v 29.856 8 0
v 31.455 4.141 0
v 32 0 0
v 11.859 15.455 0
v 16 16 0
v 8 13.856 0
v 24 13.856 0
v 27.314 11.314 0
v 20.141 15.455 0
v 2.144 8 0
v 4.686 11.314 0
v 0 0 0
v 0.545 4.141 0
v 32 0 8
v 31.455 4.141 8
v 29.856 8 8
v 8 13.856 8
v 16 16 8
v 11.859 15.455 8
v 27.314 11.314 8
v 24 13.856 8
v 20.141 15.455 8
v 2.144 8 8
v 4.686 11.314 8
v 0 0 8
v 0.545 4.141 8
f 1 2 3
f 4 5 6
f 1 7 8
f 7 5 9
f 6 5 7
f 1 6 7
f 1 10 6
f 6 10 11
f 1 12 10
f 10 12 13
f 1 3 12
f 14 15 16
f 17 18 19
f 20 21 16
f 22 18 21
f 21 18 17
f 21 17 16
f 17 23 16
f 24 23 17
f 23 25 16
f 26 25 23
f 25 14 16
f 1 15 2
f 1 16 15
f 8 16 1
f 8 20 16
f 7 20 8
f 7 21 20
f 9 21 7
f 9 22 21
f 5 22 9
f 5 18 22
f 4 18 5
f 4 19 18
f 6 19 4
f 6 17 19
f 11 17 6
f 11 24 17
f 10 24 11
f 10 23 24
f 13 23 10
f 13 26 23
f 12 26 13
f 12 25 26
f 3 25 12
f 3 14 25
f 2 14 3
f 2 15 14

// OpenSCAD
$fn = 32;

// ----------------------------------------------------------------------
// Key bar: woodruff key, 8 mm thick
// ----------------------------------------------------------------------

// --- parameters (mm) ---
profile_height = 8;       // extrusion height
profile_points = 13;      // points of the closed outline

profile = [[32, 0], [31.455, 4.141], [29.856, 8], [27.314, 11.314], [24, 13.856], [20.141, 15.455], [16, 16], [11.859, 15.455], [8, 13.856], [4.686, 11.314], [2.144, 8], [0.545, 4.141], [0, 0]];  // single closed polygon, 13 points, counter clockwise

// --- the one profile operation ---
linear_extrude(height = profile_height) polygon(points = profile);
